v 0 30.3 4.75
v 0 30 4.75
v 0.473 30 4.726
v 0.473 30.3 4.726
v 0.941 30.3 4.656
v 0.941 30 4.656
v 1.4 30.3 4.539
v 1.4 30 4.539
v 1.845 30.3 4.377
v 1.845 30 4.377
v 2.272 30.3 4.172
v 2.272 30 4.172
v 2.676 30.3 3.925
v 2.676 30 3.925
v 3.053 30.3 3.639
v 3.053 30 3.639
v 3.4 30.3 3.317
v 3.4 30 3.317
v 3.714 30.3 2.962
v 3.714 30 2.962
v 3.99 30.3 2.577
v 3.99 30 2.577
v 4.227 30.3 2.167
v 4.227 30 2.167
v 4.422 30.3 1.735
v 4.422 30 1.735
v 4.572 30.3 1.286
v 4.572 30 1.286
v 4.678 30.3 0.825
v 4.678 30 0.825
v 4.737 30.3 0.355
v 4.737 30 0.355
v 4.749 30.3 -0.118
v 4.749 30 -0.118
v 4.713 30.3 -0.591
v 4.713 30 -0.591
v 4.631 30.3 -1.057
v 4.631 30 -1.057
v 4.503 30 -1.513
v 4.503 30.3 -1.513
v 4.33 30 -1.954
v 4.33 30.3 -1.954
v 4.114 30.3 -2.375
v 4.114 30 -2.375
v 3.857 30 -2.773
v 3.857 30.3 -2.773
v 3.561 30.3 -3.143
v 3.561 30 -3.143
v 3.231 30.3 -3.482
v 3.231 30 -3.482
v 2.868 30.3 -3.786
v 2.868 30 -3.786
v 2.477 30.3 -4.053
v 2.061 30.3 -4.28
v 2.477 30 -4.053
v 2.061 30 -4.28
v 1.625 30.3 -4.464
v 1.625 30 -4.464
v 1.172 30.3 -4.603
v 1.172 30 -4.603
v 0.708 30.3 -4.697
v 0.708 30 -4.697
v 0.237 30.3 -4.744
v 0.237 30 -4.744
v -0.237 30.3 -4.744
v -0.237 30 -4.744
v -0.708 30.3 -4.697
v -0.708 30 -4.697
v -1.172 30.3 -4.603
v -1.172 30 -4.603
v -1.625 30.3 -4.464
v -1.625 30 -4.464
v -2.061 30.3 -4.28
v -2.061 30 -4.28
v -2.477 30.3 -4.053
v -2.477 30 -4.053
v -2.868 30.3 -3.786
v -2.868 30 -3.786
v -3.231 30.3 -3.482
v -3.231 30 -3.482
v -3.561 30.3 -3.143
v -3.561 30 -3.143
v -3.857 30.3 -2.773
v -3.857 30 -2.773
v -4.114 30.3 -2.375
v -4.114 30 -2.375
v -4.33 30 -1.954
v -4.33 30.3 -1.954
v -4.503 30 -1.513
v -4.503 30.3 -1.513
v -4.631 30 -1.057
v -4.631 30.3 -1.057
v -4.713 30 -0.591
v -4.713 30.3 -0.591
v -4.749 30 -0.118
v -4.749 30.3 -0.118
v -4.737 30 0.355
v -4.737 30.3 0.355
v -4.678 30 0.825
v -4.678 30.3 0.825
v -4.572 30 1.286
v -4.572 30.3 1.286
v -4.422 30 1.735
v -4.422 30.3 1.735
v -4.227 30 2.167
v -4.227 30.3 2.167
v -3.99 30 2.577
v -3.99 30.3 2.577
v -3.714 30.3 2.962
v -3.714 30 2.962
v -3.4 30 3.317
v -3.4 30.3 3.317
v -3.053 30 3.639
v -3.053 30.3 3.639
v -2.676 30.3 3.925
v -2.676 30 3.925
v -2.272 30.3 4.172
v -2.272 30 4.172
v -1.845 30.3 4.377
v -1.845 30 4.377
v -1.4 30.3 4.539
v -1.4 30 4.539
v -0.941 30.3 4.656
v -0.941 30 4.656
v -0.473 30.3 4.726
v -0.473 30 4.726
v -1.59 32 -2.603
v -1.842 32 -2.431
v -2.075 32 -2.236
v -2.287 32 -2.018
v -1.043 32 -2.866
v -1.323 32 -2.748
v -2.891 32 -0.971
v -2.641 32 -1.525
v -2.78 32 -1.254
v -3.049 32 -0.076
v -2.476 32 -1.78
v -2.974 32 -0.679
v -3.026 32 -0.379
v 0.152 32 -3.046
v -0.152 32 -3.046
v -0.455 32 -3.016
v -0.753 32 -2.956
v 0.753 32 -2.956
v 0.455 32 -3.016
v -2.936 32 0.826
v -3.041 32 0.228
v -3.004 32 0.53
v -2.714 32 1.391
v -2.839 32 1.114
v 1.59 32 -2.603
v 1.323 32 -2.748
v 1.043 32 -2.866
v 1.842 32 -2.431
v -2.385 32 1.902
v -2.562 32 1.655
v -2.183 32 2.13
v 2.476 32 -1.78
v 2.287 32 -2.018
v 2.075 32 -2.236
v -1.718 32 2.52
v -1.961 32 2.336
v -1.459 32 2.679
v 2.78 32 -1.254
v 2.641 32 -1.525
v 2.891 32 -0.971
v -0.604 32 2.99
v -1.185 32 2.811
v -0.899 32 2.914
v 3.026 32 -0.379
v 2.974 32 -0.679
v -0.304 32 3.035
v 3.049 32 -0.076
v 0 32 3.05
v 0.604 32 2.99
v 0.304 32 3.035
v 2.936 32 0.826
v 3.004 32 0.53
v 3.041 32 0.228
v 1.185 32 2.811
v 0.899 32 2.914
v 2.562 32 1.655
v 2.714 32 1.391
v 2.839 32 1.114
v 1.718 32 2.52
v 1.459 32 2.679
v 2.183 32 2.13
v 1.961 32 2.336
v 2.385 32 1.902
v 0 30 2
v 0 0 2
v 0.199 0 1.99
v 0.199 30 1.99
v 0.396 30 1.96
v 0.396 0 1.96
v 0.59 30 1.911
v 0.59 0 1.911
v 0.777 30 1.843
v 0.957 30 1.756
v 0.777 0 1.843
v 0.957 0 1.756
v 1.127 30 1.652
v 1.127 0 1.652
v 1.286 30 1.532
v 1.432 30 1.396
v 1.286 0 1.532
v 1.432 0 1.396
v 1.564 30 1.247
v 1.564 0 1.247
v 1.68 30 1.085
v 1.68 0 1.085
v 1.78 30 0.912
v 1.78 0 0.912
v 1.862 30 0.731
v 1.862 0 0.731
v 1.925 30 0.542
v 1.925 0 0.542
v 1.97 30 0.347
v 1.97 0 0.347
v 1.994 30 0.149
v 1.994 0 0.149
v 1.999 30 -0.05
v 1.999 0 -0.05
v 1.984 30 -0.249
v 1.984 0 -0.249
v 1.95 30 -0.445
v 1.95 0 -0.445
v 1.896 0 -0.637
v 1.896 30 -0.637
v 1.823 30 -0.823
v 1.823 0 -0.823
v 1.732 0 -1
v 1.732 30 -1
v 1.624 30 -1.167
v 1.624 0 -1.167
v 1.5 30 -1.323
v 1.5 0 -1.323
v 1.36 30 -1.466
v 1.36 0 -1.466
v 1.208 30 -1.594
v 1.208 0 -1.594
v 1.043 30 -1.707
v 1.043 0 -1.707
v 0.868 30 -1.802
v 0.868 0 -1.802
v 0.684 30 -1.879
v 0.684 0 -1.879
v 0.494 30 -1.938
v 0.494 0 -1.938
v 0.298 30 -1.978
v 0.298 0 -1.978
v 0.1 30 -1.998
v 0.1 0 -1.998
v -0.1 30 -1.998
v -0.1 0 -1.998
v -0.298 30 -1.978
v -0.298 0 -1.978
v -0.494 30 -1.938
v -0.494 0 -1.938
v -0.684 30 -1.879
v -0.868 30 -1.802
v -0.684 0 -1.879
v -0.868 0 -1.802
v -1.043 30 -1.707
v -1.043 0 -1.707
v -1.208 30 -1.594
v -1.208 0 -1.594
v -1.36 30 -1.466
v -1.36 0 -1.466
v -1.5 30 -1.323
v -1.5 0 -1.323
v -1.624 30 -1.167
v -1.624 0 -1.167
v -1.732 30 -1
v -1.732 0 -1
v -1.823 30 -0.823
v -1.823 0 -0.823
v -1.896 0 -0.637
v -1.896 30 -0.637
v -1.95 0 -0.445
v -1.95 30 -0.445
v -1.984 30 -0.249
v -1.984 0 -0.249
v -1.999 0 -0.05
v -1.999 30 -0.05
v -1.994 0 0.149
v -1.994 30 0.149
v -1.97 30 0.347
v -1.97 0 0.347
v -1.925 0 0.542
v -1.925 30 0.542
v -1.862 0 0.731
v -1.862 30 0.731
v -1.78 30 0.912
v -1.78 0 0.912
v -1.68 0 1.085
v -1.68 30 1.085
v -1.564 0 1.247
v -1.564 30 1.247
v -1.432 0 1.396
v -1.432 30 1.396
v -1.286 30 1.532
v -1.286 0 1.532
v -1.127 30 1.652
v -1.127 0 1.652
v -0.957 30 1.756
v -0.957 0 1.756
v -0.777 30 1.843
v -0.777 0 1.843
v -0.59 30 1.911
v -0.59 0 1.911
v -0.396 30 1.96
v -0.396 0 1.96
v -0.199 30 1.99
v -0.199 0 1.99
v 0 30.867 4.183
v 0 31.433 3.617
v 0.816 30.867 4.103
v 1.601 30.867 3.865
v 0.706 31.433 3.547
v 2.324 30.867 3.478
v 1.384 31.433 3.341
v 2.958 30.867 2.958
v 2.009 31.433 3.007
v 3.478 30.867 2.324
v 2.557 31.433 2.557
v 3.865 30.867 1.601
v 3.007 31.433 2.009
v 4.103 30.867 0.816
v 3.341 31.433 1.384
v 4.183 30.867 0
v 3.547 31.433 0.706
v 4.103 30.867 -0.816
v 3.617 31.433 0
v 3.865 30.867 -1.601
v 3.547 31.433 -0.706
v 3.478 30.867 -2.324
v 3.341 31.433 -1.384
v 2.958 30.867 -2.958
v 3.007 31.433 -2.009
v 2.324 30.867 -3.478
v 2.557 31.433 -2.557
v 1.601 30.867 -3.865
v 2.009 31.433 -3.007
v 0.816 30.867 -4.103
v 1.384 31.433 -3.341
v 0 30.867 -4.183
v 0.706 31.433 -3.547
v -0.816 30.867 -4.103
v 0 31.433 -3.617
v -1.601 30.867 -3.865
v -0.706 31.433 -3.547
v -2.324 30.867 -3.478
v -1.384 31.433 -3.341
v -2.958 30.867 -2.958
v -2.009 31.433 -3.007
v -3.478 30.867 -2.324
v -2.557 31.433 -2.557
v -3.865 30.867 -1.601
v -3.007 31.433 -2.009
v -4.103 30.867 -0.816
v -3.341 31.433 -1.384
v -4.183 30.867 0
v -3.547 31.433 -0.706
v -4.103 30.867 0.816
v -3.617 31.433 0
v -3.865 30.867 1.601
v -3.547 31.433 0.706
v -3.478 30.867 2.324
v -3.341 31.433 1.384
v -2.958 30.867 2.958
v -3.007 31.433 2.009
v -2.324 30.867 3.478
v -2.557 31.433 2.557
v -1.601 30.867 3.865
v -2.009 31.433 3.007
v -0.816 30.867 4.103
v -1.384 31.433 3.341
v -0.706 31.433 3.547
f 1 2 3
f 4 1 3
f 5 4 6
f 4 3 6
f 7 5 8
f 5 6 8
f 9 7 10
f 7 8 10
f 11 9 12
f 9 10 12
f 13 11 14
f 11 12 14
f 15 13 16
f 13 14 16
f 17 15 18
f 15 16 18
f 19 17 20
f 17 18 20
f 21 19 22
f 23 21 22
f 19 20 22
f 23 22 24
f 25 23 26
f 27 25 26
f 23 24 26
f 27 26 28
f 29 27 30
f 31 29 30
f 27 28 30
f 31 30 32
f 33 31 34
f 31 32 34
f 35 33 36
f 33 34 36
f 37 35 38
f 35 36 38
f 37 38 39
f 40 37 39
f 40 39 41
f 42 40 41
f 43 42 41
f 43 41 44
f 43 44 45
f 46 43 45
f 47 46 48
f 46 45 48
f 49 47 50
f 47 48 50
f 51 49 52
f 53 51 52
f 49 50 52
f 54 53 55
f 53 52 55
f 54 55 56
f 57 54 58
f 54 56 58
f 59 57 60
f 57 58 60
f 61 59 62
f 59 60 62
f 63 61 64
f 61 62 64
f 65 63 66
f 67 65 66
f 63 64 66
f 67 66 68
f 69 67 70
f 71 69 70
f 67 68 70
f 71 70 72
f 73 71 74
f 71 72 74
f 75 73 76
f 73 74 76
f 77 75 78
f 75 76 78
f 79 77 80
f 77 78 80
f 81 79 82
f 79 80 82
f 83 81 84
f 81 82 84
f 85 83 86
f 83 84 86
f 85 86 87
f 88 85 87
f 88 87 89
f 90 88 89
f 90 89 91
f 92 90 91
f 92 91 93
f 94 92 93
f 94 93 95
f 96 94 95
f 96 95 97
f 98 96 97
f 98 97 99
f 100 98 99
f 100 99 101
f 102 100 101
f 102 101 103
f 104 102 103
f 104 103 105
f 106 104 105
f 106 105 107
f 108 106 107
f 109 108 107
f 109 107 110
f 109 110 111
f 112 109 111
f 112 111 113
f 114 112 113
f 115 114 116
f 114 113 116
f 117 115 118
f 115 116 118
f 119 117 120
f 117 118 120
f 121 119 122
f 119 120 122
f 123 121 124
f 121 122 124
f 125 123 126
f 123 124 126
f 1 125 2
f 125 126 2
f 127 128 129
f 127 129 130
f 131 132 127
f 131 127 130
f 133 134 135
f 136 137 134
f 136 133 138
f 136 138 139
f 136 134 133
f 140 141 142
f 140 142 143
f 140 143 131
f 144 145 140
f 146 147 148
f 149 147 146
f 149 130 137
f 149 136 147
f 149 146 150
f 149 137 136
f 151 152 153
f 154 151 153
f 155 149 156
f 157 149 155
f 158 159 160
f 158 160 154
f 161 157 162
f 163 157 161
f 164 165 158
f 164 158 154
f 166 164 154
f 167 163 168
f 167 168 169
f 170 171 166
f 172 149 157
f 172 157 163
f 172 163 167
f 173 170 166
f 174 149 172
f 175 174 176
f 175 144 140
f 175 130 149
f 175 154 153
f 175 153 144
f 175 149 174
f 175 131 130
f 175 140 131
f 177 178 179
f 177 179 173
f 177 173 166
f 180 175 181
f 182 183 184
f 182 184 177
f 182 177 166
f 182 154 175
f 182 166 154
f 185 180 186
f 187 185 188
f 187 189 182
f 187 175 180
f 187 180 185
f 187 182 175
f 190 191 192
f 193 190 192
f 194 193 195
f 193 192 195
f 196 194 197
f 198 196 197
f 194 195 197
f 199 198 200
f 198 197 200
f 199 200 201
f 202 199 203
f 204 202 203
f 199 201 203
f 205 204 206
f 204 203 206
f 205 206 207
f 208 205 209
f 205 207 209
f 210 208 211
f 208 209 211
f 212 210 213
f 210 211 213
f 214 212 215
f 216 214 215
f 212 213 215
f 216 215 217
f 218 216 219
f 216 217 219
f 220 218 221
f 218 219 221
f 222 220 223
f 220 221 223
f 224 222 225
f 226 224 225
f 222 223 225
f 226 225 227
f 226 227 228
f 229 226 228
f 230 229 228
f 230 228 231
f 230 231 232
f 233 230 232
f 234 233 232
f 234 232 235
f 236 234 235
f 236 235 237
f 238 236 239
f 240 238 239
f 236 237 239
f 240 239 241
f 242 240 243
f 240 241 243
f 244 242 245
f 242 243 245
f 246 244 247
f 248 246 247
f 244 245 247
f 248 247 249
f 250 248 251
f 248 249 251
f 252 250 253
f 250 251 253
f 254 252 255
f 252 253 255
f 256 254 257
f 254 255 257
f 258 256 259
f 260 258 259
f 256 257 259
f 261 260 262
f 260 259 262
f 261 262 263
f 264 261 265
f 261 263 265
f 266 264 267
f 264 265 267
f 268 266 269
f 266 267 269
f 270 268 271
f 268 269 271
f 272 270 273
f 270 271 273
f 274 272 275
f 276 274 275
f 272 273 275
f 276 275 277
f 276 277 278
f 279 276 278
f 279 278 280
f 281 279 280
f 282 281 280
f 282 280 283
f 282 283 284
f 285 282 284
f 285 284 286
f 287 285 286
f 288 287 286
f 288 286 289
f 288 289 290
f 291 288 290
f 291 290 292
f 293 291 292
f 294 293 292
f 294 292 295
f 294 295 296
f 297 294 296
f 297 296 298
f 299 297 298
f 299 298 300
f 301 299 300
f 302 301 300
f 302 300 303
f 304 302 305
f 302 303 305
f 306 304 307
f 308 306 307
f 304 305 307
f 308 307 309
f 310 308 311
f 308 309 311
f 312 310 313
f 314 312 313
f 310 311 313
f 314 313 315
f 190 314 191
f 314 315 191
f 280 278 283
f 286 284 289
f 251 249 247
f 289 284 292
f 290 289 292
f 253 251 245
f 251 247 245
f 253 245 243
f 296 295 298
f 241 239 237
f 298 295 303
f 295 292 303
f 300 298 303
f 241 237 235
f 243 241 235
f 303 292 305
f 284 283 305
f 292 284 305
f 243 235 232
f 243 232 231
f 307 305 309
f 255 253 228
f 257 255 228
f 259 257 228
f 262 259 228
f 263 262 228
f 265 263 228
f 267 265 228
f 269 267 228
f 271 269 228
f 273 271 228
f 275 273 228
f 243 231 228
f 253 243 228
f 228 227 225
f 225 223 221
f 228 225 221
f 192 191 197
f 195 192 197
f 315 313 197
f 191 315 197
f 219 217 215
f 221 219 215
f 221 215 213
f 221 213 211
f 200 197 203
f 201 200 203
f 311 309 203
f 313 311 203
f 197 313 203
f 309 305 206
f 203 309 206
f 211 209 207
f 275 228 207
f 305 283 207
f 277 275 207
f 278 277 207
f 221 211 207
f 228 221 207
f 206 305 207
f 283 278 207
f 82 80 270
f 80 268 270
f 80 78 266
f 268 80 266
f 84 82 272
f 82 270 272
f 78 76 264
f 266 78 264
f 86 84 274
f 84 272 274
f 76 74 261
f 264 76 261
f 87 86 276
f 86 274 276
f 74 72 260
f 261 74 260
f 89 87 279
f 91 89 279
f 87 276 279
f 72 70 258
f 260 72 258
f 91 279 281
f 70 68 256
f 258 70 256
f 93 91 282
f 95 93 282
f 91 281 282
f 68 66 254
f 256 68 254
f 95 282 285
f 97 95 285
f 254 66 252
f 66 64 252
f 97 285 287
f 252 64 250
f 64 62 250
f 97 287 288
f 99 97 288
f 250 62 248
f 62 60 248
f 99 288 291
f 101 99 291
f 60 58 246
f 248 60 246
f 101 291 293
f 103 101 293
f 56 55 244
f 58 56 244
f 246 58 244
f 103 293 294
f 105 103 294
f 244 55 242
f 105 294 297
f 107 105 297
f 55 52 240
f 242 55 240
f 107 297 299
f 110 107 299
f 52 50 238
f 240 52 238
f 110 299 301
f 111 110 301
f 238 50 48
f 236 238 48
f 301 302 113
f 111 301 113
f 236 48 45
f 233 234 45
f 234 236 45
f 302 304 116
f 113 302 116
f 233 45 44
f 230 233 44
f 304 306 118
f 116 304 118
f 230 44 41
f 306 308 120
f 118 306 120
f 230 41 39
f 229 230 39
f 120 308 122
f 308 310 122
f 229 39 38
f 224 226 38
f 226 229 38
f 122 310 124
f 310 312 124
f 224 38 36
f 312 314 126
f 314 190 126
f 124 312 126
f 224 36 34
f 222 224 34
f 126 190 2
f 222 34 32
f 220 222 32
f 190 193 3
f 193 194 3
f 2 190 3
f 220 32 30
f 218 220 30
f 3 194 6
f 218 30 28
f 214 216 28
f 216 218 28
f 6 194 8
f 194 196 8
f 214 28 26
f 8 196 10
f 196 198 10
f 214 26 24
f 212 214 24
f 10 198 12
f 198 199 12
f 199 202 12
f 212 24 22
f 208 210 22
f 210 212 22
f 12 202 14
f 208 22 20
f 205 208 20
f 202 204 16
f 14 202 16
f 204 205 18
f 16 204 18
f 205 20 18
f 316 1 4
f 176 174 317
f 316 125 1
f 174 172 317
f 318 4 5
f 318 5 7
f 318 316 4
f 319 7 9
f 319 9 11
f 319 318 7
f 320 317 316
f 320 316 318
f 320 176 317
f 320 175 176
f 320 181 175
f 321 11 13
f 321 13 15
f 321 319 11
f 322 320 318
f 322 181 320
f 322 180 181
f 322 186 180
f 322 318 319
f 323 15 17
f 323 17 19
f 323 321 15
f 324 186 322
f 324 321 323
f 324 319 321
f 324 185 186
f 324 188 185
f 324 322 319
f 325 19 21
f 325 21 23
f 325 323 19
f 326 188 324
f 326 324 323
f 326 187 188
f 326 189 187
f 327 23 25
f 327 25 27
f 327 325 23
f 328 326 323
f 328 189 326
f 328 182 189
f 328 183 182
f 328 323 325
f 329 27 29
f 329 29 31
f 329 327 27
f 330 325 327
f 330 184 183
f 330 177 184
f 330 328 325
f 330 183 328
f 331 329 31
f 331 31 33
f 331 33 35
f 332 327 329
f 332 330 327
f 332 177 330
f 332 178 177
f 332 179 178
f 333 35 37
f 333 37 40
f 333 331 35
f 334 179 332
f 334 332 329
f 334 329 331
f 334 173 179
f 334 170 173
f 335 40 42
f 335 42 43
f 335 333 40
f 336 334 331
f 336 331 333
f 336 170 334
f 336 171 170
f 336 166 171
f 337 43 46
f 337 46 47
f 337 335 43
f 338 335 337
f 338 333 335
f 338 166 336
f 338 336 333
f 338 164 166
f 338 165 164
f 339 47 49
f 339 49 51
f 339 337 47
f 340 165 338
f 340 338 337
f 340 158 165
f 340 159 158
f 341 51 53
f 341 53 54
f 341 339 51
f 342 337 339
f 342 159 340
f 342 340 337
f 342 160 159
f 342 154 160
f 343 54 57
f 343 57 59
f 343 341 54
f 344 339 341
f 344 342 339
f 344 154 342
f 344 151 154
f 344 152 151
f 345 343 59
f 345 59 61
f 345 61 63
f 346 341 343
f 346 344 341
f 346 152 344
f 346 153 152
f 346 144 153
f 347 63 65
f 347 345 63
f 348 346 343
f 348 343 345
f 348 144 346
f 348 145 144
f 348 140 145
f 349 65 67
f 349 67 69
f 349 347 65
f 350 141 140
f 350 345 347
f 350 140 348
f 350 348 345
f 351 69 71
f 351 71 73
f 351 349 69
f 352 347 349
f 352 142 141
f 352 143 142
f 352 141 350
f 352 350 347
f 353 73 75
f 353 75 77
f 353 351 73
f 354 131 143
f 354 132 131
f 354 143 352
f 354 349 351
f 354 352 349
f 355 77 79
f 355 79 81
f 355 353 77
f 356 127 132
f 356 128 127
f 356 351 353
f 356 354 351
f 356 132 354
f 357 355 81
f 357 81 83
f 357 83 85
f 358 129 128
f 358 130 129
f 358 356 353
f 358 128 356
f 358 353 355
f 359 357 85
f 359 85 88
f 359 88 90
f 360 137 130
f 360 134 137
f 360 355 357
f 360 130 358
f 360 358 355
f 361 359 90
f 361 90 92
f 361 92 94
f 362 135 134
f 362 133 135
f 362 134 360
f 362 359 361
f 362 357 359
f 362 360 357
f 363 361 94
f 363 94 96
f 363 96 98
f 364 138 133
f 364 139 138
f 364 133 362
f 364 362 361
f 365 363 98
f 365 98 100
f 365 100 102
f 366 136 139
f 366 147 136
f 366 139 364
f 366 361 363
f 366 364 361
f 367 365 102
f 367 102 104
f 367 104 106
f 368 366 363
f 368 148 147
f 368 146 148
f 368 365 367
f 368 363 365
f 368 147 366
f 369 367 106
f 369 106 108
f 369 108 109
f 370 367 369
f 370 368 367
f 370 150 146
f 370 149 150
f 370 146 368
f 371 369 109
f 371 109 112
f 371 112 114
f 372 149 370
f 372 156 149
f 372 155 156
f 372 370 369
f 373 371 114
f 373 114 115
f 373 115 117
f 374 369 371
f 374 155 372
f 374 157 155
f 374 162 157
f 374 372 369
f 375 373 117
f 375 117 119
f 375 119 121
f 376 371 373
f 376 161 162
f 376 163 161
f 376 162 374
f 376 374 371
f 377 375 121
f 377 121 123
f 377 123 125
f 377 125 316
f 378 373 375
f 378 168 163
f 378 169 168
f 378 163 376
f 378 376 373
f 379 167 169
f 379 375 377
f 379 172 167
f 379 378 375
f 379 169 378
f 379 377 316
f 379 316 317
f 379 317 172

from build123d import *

# Parameters (mm, degrees)
SKETCH1_R           = 2
BOSS_EXTRUDE1_DEPTH = 30
SKETCH2_R           = 4.75
BOSS_EXTRUDE2_DEPTH = 2
CHAMFER1_SIZE       = 1.7


with BuildPart() as part:
    # Sketch1 → Boss-Extrude1 (new body)
    with BuildSketch(Plane(origin=(0, 0, 0), x_dir=(1, 0, 0), z_dir=(0, 1, 0))):
        with Locations(Location((0, 0, 0), (0, 0, 270))):
            Circle(SKETCH1_R)
    extrude(amount=BOSS_EXTRUDE1_DEPTH)

    # Sketch2 → Boss-Extrude2 (add)
    with BuildSketch(Plane(origin=(0, 30, 0), x_dir=(1, 0, 0), z_dir=(0, 1, 0))):
        with Locations(Location((0, 0, 0), (0, 0, 270))):
            Circle(SKETCH2_R)
    extrude(amount=BOSS_EXTRUDE2_DEPTH)

    # Chamfer1
    chamfer1_edges = [part.edges().sort_by_distance(p)[0] for p in [
        (0, 32, -4.75),
    ]]
    chamfer(chamfer1_edges, length=CHAMFER1_SIZE)


solid = part.part
